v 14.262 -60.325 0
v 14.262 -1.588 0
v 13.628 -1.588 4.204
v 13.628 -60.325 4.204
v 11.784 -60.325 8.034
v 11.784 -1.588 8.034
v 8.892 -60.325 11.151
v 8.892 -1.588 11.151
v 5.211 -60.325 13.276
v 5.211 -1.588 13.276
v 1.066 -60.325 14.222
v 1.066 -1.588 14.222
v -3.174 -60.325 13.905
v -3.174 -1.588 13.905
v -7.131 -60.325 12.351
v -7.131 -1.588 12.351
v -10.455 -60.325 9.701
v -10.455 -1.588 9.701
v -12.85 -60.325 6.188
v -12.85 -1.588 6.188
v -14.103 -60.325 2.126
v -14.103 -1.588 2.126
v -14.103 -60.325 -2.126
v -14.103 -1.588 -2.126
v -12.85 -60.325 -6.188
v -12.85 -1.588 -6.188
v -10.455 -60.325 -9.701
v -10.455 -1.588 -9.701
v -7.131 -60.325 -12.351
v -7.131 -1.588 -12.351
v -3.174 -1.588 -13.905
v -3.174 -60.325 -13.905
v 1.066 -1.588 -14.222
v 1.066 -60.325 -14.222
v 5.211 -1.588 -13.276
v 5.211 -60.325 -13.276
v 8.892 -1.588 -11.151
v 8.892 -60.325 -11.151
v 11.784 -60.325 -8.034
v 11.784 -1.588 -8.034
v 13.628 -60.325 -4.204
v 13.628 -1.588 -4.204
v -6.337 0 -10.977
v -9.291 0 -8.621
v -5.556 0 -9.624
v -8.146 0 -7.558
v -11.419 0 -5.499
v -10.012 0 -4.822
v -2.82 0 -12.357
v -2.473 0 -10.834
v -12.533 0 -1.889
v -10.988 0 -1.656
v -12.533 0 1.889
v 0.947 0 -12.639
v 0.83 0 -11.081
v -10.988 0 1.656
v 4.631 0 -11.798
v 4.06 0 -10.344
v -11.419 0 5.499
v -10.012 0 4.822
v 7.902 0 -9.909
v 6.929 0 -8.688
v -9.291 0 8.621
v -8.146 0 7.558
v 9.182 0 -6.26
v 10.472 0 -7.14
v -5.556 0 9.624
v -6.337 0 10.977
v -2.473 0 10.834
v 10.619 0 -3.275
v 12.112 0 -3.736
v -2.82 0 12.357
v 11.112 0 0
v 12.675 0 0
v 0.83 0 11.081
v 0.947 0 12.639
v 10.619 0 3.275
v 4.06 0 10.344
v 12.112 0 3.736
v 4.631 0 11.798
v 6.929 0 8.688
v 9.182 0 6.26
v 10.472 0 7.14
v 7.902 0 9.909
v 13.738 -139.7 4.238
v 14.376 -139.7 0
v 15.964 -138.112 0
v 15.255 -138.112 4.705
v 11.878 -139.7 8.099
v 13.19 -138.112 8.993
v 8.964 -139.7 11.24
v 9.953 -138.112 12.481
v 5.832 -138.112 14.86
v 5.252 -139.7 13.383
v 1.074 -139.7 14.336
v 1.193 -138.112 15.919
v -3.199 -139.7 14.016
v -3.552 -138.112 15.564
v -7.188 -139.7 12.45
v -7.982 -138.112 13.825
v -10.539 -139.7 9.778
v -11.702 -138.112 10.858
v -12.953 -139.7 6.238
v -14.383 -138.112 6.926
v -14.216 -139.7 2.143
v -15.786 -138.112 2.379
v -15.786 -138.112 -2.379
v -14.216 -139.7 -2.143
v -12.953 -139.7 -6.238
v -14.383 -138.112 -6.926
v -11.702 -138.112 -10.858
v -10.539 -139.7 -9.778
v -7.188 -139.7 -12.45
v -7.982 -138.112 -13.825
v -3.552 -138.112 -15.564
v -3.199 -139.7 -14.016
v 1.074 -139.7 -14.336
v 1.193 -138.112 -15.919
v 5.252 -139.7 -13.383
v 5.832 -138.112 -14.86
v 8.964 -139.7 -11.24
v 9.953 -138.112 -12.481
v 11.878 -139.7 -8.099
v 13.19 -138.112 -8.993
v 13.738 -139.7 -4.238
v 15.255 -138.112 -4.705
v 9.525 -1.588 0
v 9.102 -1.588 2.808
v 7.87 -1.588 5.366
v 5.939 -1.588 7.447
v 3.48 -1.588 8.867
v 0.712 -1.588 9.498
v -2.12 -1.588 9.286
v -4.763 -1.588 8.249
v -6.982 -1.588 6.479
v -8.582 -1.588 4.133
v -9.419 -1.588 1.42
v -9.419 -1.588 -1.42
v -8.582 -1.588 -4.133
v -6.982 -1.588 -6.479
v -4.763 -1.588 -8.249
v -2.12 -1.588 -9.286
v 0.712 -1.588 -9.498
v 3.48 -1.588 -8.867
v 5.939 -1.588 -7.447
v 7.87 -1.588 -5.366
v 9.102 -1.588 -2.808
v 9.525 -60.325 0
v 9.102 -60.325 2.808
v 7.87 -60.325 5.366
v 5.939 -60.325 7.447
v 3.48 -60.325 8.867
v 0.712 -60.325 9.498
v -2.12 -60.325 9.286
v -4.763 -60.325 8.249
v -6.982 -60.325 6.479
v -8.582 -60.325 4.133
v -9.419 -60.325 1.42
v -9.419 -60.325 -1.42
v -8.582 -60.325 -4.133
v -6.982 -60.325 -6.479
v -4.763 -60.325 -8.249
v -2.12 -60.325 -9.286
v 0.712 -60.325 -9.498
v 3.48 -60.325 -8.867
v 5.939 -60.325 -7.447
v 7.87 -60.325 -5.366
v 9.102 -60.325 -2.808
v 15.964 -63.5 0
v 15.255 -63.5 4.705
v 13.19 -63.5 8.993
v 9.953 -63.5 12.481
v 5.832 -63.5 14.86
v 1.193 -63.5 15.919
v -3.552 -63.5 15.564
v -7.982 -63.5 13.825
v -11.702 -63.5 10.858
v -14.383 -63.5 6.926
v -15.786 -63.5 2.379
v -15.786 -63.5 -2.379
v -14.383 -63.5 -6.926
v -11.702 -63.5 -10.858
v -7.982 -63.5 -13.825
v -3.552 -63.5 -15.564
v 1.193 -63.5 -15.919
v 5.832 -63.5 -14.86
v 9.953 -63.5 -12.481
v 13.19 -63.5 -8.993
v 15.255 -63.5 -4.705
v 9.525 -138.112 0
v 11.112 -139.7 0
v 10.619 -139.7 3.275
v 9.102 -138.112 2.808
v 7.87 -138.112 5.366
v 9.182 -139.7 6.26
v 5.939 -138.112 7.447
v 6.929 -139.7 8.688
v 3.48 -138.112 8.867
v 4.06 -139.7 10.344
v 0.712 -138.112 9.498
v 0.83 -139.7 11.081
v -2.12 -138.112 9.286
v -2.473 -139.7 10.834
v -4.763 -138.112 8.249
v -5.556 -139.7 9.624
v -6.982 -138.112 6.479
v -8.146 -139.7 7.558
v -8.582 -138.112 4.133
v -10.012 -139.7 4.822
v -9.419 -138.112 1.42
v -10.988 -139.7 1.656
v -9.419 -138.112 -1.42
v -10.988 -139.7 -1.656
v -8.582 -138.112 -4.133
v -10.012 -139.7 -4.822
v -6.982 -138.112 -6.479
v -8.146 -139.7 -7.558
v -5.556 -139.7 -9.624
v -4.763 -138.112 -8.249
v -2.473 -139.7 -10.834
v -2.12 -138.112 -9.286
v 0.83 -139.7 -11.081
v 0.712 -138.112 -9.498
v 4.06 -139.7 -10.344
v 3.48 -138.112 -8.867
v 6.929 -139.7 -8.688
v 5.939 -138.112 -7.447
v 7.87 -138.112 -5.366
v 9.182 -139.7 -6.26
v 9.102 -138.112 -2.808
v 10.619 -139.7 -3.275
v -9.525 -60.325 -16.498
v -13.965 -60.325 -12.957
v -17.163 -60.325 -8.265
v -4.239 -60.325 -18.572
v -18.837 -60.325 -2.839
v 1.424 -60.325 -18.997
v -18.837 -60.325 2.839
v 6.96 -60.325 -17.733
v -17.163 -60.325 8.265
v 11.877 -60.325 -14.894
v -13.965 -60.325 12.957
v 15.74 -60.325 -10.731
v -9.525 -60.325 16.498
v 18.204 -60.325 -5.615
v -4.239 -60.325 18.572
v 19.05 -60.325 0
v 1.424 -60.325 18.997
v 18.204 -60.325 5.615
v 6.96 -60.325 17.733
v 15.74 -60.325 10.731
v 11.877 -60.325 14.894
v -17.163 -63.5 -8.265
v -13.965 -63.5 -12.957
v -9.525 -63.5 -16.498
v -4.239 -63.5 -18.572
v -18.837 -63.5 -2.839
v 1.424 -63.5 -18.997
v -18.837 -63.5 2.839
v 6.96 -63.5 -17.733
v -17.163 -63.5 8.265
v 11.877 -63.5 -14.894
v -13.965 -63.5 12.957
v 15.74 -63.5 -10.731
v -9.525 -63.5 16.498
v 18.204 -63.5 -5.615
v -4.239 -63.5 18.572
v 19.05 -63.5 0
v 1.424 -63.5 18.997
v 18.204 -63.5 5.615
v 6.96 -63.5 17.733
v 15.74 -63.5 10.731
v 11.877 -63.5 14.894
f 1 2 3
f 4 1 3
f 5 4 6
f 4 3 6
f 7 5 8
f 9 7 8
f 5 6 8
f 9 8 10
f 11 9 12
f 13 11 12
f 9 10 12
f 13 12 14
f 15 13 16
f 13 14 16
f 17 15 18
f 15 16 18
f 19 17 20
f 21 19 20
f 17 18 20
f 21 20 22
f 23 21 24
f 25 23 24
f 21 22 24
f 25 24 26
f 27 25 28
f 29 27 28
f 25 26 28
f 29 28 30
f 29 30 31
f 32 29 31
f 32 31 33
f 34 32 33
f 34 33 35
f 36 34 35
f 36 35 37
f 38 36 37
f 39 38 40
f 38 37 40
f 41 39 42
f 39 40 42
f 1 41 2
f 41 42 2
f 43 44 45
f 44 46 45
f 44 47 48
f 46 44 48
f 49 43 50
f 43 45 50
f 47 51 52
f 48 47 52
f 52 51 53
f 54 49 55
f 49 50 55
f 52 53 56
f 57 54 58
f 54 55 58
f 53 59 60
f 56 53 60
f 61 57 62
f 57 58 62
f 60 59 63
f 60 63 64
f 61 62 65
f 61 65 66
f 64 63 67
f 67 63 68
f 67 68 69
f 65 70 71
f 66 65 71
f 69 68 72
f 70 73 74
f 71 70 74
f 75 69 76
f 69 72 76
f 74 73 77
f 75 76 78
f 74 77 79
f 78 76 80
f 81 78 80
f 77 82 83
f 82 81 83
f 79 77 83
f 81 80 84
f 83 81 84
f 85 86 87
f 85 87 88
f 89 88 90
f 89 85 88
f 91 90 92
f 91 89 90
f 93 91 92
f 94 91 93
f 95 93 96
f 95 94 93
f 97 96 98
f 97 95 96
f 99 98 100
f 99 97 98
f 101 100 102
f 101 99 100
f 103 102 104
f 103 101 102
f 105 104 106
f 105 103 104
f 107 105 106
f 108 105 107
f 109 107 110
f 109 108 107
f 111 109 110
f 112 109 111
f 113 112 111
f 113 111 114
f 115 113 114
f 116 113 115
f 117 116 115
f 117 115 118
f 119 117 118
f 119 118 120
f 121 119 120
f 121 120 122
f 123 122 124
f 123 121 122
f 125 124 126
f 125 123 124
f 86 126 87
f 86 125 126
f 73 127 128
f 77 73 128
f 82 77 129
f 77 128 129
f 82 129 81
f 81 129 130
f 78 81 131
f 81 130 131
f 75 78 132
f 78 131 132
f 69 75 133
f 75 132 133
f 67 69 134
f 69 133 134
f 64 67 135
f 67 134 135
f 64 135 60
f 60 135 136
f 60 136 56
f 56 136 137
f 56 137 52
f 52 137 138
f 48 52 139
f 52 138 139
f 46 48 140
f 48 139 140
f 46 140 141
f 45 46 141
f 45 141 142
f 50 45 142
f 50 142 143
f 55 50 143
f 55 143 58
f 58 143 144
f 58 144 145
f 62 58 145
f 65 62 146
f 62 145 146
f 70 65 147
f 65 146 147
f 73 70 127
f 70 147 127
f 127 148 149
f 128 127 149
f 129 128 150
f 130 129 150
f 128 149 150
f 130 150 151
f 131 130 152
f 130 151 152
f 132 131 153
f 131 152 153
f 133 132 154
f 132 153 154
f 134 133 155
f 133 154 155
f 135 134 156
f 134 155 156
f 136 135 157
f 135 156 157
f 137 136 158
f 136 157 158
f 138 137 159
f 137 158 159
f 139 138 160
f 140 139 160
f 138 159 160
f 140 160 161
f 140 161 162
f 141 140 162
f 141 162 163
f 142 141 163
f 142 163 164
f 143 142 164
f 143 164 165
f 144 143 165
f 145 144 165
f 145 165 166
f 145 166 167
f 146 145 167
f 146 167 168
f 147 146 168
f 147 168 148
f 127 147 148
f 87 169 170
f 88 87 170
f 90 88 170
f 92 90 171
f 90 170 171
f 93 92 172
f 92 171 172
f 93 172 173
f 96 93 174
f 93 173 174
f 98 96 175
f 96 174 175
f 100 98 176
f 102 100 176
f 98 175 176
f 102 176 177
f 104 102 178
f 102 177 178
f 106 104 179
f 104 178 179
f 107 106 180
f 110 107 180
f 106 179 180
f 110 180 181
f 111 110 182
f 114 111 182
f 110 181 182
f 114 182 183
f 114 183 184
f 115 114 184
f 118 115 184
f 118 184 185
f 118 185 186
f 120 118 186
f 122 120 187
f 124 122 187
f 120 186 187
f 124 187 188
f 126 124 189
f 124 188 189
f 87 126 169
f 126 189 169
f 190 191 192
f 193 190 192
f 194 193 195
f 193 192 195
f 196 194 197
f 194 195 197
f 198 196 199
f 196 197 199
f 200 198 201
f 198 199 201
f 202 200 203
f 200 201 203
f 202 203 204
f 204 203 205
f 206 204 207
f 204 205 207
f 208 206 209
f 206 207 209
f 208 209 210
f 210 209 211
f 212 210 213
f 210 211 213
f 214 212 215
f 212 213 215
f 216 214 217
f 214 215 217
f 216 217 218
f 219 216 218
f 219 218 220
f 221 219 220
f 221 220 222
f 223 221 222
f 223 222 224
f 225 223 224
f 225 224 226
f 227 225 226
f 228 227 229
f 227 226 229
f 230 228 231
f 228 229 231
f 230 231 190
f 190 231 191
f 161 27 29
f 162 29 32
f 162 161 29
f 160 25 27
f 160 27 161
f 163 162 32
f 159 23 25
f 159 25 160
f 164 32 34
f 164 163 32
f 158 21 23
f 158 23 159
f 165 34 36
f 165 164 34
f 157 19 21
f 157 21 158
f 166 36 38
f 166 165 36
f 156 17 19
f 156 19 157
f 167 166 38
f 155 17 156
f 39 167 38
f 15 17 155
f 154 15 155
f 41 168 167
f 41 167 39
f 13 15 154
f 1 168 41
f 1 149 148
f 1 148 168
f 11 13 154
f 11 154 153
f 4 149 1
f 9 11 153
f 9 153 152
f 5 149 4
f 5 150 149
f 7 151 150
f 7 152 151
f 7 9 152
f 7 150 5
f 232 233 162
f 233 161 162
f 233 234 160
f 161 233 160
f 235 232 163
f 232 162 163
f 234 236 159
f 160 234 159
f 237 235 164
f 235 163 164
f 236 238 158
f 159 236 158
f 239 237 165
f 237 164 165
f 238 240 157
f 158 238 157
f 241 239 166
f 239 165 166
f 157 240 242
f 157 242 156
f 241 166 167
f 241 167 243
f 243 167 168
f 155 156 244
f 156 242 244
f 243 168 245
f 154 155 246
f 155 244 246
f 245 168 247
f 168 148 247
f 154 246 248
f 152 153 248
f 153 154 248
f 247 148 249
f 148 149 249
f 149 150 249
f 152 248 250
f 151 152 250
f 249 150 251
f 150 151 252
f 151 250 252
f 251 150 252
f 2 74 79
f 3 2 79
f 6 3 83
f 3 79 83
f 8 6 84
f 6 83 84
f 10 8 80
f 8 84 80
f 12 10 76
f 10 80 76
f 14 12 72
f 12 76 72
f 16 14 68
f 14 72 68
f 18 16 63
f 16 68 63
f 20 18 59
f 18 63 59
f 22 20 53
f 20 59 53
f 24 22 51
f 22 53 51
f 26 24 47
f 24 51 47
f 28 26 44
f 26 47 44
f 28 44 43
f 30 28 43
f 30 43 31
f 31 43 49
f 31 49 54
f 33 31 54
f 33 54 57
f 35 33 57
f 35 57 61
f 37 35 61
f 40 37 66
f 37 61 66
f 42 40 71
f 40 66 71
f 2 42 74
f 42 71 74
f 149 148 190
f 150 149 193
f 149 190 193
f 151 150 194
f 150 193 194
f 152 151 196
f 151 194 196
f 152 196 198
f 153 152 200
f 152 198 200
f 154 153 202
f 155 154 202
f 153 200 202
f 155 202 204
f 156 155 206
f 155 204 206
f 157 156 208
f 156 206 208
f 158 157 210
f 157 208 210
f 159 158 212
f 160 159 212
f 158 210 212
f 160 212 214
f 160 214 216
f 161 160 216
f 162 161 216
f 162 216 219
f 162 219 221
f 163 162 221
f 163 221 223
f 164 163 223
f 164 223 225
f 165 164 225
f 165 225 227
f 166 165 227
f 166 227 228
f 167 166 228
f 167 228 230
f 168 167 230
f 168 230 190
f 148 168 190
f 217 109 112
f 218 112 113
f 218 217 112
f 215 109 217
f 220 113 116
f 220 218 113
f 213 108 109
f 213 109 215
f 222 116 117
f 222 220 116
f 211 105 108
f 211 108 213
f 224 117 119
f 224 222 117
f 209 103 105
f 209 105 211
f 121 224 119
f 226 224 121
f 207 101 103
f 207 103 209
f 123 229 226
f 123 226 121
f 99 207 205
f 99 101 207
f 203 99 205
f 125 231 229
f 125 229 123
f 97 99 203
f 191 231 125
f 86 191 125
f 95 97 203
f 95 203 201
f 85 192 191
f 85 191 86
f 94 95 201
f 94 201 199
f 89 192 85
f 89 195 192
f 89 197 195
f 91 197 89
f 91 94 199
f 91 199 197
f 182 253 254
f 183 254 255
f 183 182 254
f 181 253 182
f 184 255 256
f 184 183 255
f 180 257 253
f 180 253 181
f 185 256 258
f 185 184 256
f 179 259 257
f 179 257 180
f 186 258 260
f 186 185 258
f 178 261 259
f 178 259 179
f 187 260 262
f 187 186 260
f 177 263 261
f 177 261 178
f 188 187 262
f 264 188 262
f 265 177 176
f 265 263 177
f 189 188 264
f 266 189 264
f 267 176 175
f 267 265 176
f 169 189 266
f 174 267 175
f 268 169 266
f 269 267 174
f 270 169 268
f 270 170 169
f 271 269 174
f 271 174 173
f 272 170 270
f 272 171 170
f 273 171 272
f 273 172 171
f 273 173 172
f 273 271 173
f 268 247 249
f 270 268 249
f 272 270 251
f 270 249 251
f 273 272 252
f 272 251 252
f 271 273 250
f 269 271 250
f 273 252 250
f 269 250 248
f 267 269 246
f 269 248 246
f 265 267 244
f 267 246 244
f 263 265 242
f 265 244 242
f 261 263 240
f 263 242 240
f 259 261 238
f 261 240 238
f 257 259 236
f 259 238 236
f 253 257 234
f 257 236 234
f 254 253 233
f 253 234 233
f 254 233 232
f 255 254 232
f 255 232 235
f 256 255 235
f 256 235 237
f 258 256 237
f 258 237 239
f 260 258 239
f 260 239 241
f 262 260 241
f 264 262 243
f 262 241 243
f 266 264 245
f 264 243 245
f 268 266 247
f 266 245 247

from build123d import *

# Parameters (mm, degrees)
F0_R      = 14.2621
F1_DEPTH  = 60.325
F2_R      = 19.05
F2_R_2    = 14.2621
F3_DEPTH  = 3.175
F5_R      = 15.9639
F6_DEPTH  = 76.2
F7_R      = 9.525
F8_DEPTH  = 139.701
F9_SIZE   = 1.5875
F9_2_SIZE = 1.5875


with BuildPart() as f1:
    # F0 (on Front) → F1 (new body)
    with BuildSketch(Plane.XZ):
        Circle(F0_R)
    extrude(amount=F1_DEPTH)


with BuildPart() as f3:
    # F2 (on face) → F3 (new body)
    with BuildSketch(Plane.XZ.offset(60.325)):
        Circle(F2_R)
        Circle(F2_R_2, mode=Mode.SUBTRACT)
        Circle(F2_R_2)
    extrude(amount=F3_DEPTH)

    # F5 (on face) → F6 (join)
    with BuildSketch(Plane.XZ.offset(63.5)):
        Circle(F5_R)
    extrude(amount=F6_DEPTH)


with BuildPart() as f8_tool:
    # F7 (on face) → F8 (new body, through all)
    with BuildSketch(Plane.XZ.offset(139.7)):
        Circle(F7_R)
    extrude(amount=-F8_DEPTH)


with BuildPart() as f1_1:
    add(f1.part)

    # F8: cut by f8_tool
    add(f8_tool.part, mode=Mode.SUBTRACT)

    # F9
    f9_edges = [f1_1.edges().sort_by_distance(p)[0] for p in [
        (-14.2621, 0, 0),
        (-9.525, 0, 0),
    ]]
    chamfer(f9_edges, length=F9_SIZE)


with BuildPart() as f3_1:
    add(f3.part)

    # F8: cut by f8_tool
    add(f8_tool.part, mode=Mode.SUBTRACT)

    # F9#2
    f9_2_edges = [f3_1.edges().sort_by_distance(p)[0] for p in [
        (-15.9639, -139.7, 0),
        (-9.525, -139.7, 0),
    ]]
    chamfer(f9_2_edges, length=F9_2_SIZE)


solid = Compound([f1_1.part, f3_1.part])
